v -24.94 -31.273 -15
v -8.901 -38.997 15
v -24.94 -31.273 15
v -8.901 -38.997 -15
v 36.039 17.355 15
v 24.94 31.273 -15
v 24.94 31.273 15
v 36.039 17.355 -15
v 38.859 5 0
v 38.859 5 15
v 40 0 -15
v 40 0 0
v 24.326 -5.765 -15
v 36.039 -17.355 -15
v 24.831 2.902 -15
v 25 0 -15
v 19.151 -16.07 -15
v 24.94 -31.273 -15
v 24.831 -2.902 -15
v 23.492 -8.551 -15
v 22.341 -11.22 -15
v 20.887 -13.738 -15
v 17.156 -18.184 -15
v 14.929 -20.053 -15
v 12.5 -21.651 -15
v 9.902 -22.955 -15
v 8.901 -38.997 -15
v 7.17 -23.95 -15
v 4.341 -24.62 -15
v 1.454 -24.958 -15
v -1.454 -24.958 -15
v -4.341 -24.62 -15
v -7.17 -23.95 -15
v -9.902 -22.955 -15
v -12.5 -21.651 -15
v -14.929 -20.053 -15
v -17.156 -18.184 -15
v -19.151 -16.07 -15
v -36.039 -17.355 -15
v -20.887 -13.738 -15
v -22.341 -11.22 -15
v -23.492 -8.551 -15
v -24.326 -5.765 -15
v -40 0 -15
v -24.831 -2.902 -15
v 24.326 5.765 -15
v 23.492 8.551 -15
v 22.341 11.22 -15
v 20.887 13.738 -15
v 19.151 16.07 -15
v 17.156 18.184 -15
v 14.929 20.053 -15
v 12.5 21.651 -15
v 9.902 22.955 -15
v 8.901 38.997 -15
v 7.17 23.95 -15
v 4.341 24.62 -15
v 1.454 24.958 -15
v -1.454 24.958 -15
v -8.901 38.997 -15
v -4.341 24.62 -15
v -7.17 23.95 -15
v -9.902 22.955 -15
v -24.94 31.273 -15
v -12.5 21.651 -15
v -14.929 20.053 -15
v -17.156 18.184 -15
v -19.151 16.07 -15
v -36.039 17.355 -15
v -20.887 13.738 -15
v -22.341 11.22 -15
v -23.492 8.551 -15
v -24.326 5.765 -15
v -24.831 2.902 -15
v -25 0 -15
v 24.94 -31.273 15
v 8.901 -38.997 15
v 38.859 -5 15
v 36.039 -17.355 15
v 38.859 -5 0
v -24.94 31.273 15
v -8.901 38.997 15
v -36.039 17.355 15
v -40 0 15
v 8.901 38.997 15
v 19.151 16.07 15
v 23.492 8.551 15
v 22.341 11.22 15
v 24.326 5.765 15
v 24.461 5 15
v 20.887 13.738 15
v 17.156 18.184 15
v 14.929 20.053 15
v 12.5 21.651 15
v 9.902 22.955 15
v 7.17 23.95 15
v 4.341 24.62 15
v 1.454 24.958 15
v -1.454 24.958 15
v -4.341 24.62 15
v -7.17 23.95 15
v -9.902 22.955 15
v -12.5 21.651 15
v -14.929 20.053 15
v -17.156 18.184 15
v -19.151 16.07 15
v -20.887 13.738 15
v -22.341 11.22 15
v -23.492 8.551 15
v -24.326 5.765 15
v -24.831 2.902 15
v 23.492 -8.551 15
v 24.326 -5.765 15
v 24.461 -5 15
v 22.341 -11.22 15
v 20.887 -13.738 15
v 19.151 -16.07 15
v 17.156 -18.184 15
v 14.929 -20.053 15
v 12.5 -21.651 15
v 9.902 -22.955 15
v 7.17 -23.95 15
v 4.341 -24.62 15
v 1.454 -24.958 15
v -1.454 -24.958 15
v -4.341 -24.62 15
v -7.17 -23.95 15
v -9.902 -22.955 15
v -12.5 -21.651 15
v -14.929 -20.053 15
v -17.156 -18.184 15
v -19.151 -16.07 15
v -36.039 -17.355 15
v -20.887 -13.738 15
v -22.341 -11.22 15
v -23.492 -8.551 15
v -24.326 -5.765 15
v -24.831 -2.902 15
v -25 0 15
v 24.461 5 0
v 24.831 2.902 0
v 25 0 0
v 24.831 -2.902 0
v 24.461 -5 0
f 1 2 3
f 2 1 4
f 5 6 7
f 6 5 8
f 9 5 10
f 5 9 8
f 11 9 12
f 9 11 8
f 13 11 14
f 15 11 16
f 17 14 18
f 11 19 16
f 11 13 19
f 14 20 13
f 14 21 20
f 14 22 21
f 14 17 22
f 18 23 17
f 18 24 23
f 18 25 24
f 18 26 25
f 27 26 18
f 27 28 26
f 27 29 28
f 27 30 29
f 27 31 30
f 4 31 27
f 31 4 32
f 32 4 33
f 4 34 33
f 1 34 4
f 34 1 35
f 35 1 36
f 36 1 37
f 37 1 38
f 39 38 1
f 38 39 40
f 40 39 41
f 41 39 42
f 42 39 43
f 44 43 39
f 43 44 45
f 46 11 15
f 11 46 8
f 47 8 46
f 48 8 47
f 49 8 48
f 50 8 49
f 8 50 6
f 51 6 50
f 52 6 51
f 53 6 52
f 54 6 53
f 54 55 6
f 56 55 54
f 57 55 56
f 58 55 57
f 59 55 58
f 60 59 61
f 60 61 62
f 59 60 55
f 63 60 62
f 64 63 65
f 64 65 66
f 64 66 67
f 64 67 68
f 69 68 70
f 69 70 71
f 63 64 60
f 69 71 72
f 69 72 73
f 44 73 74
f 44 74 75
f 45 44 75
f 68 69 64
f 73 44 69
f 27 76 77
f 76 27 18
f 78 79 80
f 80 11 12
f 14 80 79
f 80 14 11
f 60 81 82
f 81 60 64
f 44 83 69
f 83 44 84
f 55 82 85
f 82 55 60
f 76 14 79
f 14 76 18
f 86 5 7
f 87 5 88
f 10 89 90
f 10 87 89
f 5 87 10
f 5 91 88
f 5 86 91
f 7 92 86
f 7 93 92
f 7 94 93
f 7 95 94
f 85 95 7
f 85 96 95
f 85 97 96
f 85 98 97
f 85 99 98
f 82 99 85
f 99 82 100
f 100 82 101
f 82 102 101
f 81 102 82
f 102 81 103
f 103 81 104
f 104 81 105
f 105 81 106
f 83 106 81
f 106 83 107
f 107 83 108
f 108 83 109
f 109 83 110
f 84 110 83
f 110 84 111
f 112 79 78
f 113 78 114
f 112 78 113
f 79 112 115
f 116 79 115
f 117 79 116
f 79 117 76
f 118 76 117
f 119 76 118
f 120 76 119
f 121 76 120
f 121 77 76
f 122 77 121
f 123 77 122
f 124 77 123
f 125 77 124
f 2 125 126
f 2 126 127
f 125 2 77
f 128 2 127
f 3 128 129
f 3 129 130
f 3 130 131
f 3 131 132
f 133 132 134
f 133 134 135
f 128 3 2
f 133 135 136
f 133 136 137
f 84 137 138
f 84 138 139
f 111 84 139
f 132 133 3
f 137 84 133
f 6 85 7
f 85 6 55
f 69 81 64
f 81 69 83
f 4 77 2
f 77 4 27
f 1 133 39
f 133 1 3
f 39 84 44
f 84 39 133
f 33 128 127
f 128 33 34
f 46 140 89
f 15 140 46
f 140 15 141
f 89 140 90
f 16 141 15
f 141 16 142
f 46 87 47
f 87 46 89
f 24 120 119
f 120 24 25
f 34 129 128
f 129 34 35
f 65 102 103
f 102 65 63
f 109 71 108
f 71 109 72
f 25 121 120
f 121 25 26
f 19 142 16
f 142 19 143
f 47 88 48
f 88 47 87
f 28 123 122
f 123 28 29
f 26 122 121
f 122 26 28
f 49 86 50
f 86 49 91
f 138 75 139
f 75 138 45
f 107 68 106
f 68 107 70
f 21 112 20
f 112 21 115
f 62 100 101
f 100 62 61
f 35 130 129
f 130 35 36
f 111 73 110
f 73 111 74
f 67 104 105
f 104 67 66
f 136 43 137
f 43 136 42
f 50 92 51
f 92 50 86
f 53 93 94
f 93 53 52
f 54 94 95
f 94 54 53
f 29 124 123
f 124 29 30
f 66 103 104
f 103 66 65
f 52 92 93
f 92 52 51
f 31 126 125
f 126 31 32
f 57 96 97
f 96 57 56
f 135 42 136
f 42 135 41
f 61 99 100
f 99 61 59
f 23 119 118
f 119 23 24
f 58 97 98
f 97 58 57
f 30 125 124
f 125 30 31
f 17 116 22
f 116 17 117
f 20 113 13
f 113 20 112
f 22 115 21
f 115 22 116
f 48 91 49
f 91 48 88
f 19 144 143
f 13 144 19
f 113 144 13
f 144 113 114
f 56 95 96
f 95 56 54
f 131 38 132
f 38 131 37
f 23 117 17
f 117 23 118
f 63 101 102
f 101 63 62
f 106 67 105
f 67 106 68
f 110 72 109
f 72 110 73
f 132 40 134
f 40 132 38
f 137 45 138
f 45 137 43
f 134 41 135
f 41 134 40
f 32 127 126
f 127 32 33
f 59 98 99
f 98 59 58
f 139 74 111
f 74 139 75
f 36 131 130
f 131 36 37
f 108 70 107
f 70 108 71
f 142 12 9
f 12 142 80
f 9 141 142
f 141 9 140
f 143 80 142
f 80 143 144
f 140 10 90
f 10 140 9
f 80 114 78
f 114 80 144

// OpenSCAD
EPS=0.01;

difference() {
    cylinder(h=30, r=40, center = true, $fn=14);

    cylinder(h=35+2*EPS, r=25, center = true, $fn=54);
    translate([20,-5,0]) cube(size=[30,10,20]);
}
